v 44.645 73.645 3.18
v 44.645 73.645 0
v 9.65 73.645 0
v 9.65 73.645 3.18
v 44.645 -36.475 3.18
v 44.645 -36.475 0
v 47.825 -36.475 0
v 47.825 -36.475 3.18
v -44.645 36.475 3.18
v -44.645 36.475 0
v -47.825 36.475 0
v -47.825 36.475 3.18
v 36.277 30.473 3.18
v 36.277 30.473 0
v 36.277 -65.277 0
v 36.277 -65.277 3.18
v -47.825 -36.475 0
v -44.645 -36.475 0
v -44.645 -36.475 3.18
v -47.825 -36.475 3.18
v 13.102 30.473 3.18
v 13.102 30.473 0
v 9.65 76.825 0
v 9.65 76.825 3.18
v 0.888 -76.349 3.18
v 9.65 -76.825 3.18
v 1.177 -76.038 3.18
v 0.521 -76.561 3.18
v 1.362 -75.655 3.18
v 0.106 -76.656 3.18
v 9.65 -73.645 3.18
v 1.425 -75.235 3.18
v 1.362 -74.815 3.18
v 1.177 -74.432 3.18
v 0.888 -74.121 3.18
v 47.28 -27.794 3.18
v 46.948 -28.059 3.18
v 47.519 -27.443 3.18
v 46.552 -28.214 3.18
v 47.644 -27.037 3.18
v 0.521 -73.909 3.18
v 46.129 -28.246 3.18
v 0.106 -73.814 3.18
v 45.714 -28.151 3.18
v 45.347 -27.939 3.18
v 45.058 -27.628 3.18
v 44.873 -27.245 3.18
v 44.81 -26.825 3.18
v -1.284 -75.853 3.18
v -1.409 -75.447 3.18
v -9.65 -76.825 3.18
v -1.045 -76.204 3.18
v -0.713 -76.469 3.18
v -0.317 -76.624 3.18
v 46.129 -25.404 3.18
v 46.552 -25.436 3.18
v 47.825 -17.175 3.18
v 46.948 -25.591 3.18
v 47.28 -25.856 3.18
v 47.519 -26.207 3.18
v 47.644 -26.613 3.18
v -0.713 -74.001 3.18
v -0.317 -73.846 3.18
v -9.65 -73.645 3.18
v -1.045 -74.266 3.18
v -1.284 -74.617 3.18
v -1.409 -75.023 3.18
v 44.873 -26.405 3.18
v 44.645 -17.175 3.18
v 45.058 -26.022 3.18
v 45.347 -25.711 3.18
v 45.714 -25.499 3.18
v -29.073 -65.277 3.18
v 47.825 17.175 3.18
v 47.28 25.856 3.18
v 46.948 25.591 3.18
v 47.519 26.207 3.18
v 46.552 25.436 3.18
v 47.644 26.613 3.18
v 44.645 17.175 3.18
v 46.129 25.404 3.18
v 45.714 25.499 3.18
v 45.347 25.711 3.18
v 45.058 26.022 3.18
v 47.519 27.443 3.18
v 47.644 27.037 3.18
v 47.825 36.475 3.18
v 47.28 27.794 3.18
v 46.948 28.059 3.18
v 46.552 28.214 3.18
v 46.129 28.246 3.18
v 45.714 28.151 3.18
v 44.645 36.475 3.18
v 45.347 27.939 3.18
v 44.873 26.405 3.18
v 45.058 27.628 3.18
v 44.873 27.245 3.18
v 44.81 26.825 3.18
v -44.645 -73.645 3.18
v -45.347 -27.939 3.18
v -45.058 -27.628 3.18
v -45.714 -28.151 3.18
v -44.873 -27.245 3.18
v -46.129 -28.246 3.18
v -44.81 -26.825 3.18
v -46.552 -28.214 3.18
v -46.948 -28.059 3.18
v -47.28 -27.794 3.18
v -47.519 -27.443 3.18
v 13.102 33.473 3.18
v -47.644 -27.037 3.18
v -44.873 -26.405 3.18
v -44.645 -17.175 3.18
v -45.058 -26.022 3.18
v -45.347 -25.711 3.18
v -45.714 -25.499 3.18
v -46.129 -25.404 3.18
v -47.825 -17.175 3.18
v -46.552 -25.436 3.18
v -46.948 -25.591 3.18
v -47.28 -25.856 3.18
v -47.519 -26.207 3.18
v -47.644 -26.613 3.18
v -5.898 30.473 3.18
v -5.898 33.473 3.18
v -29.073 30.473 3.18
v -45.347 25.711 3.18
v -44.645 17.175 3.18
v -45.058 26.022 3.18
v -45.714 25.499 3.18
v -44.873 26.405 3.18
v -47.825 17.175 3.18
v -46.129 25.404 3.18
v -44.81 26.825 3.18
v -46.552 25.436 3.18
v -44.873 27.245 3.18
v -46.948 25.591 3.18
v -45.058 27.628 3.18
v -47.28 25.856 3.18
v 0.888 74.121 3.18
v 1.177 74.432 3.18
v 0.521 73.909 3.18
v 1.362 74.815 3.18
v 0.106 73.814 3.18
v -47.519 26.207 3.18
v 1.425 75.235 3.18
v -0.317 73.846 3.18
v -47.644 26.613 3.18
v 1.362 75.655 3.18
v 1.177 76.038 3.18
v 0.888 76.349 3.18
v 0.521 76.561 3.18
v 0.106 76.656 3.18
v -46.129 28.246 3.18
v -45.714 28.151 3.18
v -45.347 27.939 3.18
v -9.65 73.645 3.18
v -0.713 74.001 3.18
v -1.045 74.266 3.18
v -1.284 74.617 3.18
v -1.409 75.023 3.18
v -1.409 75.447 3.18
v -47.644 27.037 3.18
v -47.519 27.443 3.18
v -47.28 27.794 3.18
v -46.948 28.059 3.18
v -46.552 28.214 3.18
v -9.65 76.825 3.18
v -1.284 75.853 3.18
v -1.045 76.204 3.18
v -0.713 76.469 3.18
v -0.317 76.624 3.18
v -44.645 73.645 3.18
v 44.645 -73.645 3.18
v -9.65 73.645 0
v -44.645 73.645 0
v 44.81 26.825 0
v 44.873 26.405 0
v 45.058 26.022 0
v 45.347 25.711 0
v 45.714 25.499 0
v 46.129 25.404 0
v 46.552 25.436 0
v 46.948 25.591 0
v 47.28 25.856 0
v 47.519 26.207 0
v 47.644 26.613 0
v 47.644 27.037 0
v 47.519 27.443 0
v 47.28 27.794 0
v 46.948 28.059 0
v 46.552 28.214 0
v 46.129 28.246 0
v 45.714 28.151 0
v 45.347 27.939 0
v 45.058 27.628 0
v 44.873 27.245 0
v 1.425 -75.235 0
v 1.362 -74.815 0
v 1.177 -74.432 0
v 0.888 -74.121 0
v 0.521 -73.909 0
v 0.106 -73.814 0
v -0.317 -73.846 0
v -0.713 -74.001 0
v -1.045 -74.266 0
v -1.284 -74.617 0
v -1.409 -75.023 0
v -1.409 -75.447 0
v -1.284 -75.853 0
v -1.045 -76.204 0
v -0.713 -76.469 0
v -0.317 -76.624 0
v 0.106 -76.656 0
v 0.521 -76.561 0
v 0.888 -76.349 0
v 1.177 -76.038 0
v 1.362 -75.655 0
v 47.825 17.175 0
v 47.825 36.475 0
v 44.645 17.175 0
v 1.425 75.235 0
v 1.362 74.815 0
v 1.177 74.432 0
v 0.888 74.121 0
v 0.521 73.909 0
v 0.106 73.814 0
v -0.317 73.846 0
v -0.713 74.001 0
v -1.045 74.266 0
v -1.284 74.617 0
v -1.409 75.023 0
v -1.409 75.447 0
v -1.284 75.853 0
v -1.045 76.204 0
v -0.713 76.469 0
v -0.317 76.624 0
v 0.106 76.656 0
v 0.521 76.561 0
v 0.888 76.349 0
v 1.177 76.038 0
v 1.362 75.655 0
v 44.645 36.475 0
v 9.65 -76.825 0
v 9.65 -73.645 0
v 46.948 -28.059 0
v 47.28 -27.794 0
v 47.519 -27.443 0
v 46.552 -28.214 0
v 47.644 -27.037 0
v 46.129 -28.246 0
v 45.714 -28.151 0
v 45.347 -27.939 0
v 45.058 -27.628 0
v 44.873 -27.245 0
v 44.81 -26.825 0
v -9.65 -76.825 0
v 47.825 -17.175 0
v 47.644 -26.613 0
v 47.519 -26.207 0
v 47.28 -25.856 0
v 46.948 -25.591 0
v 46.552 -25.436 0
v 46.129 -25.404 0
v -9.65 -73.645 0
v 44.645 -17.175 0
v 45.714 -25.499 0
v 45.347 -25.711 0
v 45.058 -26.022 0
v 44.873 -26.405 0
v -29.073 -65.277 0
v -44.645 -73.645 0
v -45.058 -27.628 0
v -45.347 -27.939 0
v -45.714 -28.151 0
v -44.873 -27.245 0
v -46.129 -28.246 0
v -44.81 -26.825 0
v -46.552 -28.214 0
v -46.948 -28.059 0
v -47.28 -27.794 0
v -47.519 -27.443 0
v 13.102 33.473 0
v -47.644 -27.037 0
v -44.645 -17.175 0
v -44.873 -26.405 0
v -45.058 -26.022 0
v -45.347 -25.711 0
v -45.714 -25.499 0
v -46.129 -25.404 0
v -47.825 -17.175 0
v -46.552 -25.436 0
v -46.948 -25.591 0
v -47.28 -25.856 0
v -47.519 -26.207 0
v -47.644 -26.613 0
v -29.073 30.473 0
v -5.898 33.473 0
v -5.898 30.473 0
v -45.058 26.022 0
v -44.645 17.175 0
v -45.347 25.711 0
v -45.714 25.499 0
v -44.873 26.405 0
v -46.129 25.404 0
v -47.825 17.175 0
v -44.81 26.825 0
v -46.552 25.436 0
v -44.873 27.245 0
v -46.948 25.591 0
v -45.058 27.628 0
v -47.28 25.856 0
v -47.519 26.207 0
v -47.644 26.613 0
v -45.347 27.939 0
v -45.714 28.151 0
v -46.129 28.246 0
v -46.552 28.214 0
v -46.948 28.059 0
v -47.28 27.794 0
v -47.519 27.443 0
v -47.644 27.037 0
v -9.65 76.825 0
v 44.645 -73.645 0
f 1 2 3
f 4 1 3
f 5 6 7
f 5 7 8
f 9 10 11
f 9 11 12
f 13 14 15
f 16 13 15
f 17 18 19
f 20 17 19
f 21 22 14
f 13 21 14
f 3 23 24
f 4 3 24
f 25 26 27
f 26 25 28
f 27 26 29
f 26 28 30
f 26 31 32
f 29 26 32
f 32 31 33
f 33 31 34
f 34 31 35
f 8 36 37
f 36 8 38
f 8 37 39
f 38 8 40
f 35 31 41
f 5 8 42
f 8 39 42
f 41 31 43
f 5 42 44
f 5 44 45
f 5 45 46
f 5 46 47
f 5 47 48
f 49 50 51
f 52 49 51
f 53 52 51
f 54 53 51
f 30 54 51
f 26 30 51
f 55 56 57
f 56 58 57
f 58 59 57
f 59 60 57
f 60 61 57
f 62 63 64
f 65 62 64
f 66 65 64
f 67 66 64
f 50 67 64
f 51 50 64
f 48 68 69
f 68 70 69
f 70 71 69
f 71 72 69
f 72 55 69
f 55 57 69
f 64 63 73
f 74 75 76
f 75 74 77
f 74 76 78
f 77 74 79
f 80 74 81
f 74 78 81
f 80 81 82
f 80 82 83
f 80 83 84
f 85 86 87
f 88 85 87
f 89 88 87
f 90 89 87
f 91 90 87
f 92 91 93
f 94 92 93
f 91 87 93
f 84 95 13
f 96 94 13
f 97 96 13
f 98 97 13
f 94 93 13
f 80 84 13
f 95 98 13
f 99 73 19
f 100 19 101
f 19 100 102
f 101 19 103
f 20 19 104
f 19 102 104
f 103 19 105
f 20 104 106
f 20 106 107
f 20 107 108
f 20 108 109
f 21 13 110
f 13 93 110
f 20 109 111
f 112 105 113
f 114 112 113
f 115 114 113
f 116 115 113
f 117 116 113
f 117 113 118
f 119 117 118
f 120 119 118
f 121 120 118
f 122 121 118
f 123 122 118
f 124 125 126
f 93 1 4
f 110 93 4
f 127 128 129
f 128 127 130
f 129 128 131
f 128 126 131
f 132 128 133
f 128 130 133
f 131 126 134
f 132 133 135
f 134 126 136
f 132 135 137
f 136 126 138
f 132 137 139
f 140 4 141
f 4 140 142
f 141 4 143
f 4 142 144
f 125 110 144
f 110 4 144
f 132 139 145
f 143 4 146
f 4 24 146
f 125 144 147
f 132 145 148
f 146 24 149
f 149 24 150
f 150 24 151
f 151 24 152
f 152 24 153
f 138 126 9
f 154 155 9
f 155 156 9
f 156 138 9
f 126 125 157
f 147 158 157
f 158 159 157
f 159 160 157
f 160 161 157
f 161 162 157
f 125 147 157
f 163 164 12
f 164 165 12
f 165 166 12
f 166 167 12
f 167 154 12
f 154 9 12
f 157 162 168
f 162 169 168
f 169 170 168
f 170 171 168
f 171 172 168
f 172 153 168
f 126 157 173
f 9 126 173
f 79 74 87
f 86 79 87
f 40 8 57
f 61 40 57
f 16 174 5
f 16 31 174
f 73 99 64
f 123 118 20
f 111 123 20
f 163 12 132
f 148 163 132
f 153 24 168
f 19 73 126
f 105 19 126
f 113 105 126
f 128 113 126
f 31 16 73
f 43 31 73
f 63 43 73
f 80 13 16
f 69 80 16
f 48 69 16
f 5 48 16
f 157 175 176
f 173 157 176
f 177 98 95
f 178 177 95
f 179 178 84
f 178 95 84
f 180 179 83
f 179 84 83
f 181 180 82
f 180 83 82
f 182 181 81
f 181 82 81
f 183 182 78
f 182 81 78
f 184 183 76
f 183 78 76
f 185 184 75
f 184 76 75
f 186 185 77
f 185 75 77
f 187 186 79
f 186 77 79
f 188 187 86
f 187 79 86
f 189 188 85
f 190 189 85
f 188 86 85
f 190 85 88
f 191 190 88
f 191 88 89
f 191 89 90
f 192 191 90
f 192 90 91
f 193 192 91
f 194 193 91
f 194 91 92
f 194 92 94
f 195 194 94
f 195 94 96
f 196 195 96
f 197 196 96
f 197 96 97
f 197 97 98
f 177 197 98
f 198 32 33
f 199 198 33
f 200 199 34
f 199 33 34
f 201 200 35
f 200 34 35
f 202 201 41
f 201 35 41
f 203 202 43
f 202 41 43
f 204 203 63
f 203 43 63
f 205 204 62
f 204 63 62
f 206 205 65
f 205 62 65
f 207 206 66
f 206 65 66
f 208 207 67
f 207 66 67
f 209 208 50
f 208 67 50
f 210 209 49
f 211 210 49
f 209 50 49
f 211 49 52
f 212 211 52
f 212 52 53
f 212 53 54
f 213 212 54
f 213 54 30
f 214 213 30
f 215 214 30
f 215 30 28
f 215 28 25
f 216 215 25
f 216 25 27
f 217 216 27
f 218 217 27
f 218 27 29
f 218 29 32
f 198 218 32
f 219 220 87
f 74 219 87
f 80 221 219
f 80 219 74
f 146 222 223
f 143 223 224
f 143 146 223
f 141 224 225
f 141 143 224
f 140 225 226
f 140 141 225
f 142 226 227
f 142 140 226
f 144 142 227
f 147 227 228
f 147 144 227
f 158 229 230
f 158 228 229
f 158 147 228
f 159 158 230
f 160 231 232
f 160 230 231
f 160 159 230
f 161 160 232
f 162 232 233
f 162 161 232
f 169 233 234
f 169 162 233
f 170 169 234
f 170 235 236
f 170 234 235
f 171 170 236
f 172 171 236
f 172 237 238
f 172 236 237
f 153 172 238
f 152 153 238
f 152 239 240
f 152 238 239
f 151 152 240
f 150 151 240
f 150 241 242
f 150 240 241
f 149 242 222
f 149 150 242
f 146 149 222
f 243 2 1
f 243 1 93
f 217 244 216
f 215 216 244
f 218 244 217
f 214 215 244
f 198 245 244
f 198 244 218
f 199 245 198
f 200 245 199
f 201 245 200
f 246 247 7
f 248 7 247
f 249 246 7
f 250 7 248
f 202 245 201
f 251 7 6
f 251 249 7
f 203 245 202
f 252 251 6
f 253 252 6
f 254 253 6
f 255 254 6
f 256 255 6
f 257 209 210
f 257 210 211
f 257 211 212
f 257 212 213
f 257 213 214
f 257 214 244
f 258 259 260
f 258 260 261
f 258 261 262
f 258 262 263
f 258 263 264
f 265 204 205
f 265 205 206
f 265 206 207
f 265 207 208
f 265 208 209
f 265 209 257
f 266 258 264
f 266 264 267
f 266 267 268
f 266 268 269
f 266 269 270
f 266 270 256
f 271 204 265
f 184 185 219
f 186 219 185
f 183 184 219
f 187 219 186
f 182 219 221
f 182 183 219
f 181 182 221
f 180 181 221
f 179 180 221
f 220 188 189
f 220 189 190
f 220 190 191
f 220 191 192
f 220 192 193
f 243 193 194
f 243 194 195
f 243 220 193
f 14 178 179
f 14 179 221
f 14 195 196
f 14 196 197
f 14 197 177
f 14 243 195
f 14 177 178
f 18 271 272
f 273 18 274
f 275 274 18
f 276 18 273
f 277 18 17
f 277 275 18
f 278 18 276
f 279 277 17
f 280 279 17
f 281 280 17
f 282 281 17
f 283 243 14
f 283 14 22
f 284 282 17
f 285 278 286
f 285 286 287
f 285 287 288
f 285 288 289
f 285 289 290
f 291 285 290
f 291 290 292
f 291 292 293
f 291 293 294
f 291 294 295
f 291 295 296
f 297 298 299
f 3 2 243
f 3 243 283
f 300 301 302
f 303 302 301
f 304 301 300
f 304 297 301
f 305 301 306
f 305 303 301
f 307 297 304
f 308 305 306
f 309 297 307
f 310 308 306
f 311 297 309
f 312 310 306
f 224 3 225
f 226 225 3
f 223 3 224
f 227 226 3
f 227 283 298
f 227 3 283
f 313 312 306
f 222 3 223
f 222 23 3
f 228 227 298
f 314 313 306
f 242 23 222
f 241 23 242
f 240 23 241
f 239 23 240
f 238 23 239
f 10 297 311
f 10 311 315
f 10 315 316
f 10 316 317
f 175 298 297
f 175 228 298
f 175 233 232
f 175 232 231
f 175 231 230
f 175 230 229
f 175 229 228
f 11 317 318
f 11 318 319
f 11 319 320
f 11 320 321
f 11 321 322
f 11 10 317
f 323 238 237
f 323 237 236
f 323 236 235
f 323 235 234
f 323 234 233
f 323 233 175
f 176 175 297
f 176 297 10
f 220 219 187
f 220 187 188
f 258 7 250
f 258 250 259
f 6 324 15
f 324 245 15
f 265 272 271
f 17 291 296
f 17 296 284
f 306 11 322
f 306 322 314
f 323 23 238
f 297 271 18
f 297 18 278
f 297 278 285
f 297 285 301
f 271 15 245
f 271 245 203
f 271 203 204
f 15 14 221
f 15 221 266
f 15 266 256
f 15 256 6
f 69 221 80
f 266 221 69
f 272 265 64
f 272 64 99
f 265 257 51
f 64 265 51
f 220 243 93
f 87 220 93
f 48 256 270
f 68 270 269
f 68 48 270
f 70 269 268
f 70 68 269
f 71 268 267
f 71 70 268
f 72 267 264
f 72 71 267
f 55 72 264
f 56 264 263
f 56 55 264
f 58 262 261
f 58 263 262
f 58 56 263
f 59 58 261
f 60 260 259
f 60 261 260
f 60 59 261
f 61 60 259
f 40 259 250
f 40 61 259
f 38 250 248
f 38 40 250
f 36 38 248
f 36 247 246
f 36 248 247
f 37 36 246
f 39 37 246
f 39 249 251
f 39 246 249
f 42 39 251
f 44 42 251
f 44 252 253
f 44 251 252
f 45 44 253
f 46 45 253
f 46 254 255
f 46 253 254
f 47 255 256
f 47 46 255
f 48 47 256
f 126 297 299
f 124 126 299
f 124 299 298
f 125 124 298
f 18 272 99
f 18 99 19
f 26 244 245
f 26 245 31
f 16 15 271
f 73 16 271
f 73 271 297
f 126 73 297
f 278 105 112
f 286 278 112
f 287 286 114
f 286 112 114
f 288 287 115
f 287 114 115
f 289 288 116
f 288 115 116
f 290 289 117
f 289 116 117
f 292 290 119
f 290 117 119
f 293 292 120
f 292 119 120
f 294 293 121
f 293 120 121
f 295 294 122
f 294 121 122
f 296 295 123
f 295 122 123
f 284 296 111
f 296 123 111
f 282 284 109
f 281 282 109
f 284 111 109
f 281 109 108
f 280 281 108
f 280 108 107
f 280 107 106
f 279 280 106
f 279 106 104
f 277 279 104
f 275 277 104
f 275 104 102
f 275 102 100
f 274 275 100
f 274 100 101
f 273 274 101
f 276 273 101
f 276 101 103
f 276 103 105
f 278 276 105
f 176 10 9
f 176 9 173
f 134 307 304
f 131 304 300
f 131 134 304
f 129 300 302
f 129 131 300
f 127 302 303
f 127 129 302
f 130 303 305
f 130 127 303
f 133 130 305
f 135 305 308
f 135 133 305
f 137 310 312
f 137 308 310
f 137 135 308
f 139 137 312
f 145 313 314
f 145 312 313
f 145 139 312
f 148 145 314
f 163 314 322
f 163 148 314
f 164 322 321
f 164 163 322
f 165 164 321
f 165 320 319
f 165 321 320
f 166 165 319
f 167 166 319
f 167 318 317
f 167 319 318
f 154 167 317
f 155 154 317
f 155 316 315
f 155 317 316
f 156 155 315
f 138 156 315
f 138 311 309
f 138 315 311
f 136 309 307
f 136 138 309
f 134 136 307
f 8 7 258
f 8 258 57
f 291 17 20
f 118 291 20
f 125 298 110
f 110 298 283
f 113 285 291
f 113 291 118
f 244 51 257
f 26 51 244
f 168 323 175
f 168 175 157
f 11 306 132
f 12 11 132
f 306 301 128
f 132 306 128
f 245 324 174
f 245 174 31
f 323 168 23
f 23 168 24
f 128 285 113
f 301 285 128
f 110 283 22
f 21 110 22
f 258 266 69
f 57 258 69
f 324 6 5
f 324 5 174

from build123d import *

# Parameters (mm, degrees)
BOSS_EXTRUDE1_DEPTH     = 3.18
CUT_EXTRUDE1_DEPTH      = 87.179315674
SKETCH27_W              = 3.18
SKETCH27_H              = 19.3
BOSS_EXTRUDE9_DEPTH     = 3.18
SKETCH28_W              = 19.3
SKETCH28_H              = 3.18
BOSS_EXTRUDE10_DEPTH    = 3.18
SKETCH29_R              = 1.425
CUT_EXTRUDE14_DEPTH     = 91.550668965
SKETCH30_R              = 1.425
CUT_EXTRUDE15_DEPTH     = 91.550668965
MIRROR9_COPY_1_SKETCH_W = 3.18
MIRROR9_COPY_1_SKETCH_H = 19.3
MIRROR9_COPY_1_DEPTH    = 3.18
MIRROR9_COPY_2_SKETCH_R = 1.425
MIRROR9_COPY_2_DEPTH    = 91.550668965


with BuildPart() as part:
    # Sketch1 → Boss-Extrude1 (new body)
    with BuildSketch(Plane.XY):
        Polygon((-44.645, 73.645), (-14.881666667, 73.645), (14.881666667, 73.645), (44.645, 73.645), (44.645, -73.645), (-44.645, -73.645), align=None)
    extrude(amount=BOSS_EXTRUDE1_DEPTH)

    # Sketch3 → Cut-Extrude1 (cut, through all)
    with BuildSketch(Plane(origin=(0, 0, 0), x_dir=(-1, 0, 0), z_dir=(0, 0, -1))):
        Polygon((-13.10174207, 33.47325793), (-13.10174207, 30.47325793), (-36.27674207, 30.47325793), (-36.27674207, -65.27674207), (29.07325793, -65.27674207), (29.07325793, 30.47325793), (5.89825793, 30.47325793), (5.89825793, 33.47325793), align=None)
    extrude(amount=-CUT_EXTRUDE1_DEPTH, mode=Mode.SUBTRACT)

    # Sketch27 → Boss-Extrude9 (add)
    with BuildSketch(Plane.ZY.offset(44.645)):
        with Locations((1.59, -26.825)):
            Rectangle(SKETCH27_W, SKETCH27_H)
    boss_extrude9 = extrude(amount=BOSS_EXTRUDE9_DEPTH)

    # Sketch28 → Boss-Extrude10 (add)
    with BuildSketch(Plane.XZ.offset(73.645)):
        with Locations((0, 1.59)):
            Rectangle(SKETCH28_W, SKETCH28_H)
    boss_extrude10 = extrude(amount=BOSS_EXTRUDE10_DEPTH)

    # Sketch29 → Cut-Extrude14 (cut, through all)
    with BuildSketch(Plane.XY.offset(3.18)):
        with Locations((-46.235, -26.825)):
            Circle(SKETCH29_R)
    cut_extrude14 = extrude(amount=-CUT_EXTRUDE14_DEPTH, mode=Mode.SUBTRACT)

    # Sketch30 → Cut-Extrude15 (cut, through all)
    with BuildSketch(Plane.XY.offset(3.18)):
        with Locations((0, -75.235)):
            Circle(SKETCH30_R)
    cut_extrude15 = extrude(amount=-CUT_EXTRUDE15_DEPTH, mode=Mode.SUBTRACT)

    # Mirror8: Boss-Extrude9, Cut-Extrude14 across plane
    add(boss_extrude9.mirror(Plane(origin=(0, 0, 0), x_dir=(0, 0, 1), z_dir=(1, 0, 0))))
    add(cut_extrude14.mirror(Plane(origin=(0, 0, 0), x_dir=(0, 0, 1), z_dir=(1, 0, 0))), mode=Mode.SUBTRACT)

    # Mirror9: Boss-Extrude9, Boss-Extrude10, Cut-Extrude14, Cut-Extrude15 across plane
    add(boss_extrude9.mirror(Plane.ZX))
    add(boss_extrude10.mirror(Plane.ZX))
    add(cut_extrude14.mirror(Plane.ZX), mode=Mode.SUBTRACT)
    add(cut_extrude15.mirror(Plane.ZX), mode=Mode.SUBTRACT)

    # Mirror9 copy 1 sketch → Mirror9 copy 1 (add)
    with BuildSketch(Plane(origin=(44.645, 0, 0), x_dir=(0, 0, 1), z_dir=(1, 0, 0))):
        with Locations((1.59, -26.825)):
            Rectangle(MIRROR9_COPY_1_SKETCH_W, MIRROR9_COPY_1_SKETCH_H)
    extrude(amount=MIRROR9_COPY_1_DEPTH)

    # Mirror9 copy 2 sketch → Mirror9 copy 2 (cut, through all)
    with BuildSketch(Plane(origin=(0, 0, 3.18), x_dir=(-1, 0, 0), z_dir=(0, 0, 1))):
        with Locations((-46.235, -26.825)):
            Circle(MIRROR9_COPY_2_SKETCH_R)
    extrude(amount=-MIRROR9_COPY_2_DEPTH, mode=Mode.SUBTRACT)


solid = part.part
